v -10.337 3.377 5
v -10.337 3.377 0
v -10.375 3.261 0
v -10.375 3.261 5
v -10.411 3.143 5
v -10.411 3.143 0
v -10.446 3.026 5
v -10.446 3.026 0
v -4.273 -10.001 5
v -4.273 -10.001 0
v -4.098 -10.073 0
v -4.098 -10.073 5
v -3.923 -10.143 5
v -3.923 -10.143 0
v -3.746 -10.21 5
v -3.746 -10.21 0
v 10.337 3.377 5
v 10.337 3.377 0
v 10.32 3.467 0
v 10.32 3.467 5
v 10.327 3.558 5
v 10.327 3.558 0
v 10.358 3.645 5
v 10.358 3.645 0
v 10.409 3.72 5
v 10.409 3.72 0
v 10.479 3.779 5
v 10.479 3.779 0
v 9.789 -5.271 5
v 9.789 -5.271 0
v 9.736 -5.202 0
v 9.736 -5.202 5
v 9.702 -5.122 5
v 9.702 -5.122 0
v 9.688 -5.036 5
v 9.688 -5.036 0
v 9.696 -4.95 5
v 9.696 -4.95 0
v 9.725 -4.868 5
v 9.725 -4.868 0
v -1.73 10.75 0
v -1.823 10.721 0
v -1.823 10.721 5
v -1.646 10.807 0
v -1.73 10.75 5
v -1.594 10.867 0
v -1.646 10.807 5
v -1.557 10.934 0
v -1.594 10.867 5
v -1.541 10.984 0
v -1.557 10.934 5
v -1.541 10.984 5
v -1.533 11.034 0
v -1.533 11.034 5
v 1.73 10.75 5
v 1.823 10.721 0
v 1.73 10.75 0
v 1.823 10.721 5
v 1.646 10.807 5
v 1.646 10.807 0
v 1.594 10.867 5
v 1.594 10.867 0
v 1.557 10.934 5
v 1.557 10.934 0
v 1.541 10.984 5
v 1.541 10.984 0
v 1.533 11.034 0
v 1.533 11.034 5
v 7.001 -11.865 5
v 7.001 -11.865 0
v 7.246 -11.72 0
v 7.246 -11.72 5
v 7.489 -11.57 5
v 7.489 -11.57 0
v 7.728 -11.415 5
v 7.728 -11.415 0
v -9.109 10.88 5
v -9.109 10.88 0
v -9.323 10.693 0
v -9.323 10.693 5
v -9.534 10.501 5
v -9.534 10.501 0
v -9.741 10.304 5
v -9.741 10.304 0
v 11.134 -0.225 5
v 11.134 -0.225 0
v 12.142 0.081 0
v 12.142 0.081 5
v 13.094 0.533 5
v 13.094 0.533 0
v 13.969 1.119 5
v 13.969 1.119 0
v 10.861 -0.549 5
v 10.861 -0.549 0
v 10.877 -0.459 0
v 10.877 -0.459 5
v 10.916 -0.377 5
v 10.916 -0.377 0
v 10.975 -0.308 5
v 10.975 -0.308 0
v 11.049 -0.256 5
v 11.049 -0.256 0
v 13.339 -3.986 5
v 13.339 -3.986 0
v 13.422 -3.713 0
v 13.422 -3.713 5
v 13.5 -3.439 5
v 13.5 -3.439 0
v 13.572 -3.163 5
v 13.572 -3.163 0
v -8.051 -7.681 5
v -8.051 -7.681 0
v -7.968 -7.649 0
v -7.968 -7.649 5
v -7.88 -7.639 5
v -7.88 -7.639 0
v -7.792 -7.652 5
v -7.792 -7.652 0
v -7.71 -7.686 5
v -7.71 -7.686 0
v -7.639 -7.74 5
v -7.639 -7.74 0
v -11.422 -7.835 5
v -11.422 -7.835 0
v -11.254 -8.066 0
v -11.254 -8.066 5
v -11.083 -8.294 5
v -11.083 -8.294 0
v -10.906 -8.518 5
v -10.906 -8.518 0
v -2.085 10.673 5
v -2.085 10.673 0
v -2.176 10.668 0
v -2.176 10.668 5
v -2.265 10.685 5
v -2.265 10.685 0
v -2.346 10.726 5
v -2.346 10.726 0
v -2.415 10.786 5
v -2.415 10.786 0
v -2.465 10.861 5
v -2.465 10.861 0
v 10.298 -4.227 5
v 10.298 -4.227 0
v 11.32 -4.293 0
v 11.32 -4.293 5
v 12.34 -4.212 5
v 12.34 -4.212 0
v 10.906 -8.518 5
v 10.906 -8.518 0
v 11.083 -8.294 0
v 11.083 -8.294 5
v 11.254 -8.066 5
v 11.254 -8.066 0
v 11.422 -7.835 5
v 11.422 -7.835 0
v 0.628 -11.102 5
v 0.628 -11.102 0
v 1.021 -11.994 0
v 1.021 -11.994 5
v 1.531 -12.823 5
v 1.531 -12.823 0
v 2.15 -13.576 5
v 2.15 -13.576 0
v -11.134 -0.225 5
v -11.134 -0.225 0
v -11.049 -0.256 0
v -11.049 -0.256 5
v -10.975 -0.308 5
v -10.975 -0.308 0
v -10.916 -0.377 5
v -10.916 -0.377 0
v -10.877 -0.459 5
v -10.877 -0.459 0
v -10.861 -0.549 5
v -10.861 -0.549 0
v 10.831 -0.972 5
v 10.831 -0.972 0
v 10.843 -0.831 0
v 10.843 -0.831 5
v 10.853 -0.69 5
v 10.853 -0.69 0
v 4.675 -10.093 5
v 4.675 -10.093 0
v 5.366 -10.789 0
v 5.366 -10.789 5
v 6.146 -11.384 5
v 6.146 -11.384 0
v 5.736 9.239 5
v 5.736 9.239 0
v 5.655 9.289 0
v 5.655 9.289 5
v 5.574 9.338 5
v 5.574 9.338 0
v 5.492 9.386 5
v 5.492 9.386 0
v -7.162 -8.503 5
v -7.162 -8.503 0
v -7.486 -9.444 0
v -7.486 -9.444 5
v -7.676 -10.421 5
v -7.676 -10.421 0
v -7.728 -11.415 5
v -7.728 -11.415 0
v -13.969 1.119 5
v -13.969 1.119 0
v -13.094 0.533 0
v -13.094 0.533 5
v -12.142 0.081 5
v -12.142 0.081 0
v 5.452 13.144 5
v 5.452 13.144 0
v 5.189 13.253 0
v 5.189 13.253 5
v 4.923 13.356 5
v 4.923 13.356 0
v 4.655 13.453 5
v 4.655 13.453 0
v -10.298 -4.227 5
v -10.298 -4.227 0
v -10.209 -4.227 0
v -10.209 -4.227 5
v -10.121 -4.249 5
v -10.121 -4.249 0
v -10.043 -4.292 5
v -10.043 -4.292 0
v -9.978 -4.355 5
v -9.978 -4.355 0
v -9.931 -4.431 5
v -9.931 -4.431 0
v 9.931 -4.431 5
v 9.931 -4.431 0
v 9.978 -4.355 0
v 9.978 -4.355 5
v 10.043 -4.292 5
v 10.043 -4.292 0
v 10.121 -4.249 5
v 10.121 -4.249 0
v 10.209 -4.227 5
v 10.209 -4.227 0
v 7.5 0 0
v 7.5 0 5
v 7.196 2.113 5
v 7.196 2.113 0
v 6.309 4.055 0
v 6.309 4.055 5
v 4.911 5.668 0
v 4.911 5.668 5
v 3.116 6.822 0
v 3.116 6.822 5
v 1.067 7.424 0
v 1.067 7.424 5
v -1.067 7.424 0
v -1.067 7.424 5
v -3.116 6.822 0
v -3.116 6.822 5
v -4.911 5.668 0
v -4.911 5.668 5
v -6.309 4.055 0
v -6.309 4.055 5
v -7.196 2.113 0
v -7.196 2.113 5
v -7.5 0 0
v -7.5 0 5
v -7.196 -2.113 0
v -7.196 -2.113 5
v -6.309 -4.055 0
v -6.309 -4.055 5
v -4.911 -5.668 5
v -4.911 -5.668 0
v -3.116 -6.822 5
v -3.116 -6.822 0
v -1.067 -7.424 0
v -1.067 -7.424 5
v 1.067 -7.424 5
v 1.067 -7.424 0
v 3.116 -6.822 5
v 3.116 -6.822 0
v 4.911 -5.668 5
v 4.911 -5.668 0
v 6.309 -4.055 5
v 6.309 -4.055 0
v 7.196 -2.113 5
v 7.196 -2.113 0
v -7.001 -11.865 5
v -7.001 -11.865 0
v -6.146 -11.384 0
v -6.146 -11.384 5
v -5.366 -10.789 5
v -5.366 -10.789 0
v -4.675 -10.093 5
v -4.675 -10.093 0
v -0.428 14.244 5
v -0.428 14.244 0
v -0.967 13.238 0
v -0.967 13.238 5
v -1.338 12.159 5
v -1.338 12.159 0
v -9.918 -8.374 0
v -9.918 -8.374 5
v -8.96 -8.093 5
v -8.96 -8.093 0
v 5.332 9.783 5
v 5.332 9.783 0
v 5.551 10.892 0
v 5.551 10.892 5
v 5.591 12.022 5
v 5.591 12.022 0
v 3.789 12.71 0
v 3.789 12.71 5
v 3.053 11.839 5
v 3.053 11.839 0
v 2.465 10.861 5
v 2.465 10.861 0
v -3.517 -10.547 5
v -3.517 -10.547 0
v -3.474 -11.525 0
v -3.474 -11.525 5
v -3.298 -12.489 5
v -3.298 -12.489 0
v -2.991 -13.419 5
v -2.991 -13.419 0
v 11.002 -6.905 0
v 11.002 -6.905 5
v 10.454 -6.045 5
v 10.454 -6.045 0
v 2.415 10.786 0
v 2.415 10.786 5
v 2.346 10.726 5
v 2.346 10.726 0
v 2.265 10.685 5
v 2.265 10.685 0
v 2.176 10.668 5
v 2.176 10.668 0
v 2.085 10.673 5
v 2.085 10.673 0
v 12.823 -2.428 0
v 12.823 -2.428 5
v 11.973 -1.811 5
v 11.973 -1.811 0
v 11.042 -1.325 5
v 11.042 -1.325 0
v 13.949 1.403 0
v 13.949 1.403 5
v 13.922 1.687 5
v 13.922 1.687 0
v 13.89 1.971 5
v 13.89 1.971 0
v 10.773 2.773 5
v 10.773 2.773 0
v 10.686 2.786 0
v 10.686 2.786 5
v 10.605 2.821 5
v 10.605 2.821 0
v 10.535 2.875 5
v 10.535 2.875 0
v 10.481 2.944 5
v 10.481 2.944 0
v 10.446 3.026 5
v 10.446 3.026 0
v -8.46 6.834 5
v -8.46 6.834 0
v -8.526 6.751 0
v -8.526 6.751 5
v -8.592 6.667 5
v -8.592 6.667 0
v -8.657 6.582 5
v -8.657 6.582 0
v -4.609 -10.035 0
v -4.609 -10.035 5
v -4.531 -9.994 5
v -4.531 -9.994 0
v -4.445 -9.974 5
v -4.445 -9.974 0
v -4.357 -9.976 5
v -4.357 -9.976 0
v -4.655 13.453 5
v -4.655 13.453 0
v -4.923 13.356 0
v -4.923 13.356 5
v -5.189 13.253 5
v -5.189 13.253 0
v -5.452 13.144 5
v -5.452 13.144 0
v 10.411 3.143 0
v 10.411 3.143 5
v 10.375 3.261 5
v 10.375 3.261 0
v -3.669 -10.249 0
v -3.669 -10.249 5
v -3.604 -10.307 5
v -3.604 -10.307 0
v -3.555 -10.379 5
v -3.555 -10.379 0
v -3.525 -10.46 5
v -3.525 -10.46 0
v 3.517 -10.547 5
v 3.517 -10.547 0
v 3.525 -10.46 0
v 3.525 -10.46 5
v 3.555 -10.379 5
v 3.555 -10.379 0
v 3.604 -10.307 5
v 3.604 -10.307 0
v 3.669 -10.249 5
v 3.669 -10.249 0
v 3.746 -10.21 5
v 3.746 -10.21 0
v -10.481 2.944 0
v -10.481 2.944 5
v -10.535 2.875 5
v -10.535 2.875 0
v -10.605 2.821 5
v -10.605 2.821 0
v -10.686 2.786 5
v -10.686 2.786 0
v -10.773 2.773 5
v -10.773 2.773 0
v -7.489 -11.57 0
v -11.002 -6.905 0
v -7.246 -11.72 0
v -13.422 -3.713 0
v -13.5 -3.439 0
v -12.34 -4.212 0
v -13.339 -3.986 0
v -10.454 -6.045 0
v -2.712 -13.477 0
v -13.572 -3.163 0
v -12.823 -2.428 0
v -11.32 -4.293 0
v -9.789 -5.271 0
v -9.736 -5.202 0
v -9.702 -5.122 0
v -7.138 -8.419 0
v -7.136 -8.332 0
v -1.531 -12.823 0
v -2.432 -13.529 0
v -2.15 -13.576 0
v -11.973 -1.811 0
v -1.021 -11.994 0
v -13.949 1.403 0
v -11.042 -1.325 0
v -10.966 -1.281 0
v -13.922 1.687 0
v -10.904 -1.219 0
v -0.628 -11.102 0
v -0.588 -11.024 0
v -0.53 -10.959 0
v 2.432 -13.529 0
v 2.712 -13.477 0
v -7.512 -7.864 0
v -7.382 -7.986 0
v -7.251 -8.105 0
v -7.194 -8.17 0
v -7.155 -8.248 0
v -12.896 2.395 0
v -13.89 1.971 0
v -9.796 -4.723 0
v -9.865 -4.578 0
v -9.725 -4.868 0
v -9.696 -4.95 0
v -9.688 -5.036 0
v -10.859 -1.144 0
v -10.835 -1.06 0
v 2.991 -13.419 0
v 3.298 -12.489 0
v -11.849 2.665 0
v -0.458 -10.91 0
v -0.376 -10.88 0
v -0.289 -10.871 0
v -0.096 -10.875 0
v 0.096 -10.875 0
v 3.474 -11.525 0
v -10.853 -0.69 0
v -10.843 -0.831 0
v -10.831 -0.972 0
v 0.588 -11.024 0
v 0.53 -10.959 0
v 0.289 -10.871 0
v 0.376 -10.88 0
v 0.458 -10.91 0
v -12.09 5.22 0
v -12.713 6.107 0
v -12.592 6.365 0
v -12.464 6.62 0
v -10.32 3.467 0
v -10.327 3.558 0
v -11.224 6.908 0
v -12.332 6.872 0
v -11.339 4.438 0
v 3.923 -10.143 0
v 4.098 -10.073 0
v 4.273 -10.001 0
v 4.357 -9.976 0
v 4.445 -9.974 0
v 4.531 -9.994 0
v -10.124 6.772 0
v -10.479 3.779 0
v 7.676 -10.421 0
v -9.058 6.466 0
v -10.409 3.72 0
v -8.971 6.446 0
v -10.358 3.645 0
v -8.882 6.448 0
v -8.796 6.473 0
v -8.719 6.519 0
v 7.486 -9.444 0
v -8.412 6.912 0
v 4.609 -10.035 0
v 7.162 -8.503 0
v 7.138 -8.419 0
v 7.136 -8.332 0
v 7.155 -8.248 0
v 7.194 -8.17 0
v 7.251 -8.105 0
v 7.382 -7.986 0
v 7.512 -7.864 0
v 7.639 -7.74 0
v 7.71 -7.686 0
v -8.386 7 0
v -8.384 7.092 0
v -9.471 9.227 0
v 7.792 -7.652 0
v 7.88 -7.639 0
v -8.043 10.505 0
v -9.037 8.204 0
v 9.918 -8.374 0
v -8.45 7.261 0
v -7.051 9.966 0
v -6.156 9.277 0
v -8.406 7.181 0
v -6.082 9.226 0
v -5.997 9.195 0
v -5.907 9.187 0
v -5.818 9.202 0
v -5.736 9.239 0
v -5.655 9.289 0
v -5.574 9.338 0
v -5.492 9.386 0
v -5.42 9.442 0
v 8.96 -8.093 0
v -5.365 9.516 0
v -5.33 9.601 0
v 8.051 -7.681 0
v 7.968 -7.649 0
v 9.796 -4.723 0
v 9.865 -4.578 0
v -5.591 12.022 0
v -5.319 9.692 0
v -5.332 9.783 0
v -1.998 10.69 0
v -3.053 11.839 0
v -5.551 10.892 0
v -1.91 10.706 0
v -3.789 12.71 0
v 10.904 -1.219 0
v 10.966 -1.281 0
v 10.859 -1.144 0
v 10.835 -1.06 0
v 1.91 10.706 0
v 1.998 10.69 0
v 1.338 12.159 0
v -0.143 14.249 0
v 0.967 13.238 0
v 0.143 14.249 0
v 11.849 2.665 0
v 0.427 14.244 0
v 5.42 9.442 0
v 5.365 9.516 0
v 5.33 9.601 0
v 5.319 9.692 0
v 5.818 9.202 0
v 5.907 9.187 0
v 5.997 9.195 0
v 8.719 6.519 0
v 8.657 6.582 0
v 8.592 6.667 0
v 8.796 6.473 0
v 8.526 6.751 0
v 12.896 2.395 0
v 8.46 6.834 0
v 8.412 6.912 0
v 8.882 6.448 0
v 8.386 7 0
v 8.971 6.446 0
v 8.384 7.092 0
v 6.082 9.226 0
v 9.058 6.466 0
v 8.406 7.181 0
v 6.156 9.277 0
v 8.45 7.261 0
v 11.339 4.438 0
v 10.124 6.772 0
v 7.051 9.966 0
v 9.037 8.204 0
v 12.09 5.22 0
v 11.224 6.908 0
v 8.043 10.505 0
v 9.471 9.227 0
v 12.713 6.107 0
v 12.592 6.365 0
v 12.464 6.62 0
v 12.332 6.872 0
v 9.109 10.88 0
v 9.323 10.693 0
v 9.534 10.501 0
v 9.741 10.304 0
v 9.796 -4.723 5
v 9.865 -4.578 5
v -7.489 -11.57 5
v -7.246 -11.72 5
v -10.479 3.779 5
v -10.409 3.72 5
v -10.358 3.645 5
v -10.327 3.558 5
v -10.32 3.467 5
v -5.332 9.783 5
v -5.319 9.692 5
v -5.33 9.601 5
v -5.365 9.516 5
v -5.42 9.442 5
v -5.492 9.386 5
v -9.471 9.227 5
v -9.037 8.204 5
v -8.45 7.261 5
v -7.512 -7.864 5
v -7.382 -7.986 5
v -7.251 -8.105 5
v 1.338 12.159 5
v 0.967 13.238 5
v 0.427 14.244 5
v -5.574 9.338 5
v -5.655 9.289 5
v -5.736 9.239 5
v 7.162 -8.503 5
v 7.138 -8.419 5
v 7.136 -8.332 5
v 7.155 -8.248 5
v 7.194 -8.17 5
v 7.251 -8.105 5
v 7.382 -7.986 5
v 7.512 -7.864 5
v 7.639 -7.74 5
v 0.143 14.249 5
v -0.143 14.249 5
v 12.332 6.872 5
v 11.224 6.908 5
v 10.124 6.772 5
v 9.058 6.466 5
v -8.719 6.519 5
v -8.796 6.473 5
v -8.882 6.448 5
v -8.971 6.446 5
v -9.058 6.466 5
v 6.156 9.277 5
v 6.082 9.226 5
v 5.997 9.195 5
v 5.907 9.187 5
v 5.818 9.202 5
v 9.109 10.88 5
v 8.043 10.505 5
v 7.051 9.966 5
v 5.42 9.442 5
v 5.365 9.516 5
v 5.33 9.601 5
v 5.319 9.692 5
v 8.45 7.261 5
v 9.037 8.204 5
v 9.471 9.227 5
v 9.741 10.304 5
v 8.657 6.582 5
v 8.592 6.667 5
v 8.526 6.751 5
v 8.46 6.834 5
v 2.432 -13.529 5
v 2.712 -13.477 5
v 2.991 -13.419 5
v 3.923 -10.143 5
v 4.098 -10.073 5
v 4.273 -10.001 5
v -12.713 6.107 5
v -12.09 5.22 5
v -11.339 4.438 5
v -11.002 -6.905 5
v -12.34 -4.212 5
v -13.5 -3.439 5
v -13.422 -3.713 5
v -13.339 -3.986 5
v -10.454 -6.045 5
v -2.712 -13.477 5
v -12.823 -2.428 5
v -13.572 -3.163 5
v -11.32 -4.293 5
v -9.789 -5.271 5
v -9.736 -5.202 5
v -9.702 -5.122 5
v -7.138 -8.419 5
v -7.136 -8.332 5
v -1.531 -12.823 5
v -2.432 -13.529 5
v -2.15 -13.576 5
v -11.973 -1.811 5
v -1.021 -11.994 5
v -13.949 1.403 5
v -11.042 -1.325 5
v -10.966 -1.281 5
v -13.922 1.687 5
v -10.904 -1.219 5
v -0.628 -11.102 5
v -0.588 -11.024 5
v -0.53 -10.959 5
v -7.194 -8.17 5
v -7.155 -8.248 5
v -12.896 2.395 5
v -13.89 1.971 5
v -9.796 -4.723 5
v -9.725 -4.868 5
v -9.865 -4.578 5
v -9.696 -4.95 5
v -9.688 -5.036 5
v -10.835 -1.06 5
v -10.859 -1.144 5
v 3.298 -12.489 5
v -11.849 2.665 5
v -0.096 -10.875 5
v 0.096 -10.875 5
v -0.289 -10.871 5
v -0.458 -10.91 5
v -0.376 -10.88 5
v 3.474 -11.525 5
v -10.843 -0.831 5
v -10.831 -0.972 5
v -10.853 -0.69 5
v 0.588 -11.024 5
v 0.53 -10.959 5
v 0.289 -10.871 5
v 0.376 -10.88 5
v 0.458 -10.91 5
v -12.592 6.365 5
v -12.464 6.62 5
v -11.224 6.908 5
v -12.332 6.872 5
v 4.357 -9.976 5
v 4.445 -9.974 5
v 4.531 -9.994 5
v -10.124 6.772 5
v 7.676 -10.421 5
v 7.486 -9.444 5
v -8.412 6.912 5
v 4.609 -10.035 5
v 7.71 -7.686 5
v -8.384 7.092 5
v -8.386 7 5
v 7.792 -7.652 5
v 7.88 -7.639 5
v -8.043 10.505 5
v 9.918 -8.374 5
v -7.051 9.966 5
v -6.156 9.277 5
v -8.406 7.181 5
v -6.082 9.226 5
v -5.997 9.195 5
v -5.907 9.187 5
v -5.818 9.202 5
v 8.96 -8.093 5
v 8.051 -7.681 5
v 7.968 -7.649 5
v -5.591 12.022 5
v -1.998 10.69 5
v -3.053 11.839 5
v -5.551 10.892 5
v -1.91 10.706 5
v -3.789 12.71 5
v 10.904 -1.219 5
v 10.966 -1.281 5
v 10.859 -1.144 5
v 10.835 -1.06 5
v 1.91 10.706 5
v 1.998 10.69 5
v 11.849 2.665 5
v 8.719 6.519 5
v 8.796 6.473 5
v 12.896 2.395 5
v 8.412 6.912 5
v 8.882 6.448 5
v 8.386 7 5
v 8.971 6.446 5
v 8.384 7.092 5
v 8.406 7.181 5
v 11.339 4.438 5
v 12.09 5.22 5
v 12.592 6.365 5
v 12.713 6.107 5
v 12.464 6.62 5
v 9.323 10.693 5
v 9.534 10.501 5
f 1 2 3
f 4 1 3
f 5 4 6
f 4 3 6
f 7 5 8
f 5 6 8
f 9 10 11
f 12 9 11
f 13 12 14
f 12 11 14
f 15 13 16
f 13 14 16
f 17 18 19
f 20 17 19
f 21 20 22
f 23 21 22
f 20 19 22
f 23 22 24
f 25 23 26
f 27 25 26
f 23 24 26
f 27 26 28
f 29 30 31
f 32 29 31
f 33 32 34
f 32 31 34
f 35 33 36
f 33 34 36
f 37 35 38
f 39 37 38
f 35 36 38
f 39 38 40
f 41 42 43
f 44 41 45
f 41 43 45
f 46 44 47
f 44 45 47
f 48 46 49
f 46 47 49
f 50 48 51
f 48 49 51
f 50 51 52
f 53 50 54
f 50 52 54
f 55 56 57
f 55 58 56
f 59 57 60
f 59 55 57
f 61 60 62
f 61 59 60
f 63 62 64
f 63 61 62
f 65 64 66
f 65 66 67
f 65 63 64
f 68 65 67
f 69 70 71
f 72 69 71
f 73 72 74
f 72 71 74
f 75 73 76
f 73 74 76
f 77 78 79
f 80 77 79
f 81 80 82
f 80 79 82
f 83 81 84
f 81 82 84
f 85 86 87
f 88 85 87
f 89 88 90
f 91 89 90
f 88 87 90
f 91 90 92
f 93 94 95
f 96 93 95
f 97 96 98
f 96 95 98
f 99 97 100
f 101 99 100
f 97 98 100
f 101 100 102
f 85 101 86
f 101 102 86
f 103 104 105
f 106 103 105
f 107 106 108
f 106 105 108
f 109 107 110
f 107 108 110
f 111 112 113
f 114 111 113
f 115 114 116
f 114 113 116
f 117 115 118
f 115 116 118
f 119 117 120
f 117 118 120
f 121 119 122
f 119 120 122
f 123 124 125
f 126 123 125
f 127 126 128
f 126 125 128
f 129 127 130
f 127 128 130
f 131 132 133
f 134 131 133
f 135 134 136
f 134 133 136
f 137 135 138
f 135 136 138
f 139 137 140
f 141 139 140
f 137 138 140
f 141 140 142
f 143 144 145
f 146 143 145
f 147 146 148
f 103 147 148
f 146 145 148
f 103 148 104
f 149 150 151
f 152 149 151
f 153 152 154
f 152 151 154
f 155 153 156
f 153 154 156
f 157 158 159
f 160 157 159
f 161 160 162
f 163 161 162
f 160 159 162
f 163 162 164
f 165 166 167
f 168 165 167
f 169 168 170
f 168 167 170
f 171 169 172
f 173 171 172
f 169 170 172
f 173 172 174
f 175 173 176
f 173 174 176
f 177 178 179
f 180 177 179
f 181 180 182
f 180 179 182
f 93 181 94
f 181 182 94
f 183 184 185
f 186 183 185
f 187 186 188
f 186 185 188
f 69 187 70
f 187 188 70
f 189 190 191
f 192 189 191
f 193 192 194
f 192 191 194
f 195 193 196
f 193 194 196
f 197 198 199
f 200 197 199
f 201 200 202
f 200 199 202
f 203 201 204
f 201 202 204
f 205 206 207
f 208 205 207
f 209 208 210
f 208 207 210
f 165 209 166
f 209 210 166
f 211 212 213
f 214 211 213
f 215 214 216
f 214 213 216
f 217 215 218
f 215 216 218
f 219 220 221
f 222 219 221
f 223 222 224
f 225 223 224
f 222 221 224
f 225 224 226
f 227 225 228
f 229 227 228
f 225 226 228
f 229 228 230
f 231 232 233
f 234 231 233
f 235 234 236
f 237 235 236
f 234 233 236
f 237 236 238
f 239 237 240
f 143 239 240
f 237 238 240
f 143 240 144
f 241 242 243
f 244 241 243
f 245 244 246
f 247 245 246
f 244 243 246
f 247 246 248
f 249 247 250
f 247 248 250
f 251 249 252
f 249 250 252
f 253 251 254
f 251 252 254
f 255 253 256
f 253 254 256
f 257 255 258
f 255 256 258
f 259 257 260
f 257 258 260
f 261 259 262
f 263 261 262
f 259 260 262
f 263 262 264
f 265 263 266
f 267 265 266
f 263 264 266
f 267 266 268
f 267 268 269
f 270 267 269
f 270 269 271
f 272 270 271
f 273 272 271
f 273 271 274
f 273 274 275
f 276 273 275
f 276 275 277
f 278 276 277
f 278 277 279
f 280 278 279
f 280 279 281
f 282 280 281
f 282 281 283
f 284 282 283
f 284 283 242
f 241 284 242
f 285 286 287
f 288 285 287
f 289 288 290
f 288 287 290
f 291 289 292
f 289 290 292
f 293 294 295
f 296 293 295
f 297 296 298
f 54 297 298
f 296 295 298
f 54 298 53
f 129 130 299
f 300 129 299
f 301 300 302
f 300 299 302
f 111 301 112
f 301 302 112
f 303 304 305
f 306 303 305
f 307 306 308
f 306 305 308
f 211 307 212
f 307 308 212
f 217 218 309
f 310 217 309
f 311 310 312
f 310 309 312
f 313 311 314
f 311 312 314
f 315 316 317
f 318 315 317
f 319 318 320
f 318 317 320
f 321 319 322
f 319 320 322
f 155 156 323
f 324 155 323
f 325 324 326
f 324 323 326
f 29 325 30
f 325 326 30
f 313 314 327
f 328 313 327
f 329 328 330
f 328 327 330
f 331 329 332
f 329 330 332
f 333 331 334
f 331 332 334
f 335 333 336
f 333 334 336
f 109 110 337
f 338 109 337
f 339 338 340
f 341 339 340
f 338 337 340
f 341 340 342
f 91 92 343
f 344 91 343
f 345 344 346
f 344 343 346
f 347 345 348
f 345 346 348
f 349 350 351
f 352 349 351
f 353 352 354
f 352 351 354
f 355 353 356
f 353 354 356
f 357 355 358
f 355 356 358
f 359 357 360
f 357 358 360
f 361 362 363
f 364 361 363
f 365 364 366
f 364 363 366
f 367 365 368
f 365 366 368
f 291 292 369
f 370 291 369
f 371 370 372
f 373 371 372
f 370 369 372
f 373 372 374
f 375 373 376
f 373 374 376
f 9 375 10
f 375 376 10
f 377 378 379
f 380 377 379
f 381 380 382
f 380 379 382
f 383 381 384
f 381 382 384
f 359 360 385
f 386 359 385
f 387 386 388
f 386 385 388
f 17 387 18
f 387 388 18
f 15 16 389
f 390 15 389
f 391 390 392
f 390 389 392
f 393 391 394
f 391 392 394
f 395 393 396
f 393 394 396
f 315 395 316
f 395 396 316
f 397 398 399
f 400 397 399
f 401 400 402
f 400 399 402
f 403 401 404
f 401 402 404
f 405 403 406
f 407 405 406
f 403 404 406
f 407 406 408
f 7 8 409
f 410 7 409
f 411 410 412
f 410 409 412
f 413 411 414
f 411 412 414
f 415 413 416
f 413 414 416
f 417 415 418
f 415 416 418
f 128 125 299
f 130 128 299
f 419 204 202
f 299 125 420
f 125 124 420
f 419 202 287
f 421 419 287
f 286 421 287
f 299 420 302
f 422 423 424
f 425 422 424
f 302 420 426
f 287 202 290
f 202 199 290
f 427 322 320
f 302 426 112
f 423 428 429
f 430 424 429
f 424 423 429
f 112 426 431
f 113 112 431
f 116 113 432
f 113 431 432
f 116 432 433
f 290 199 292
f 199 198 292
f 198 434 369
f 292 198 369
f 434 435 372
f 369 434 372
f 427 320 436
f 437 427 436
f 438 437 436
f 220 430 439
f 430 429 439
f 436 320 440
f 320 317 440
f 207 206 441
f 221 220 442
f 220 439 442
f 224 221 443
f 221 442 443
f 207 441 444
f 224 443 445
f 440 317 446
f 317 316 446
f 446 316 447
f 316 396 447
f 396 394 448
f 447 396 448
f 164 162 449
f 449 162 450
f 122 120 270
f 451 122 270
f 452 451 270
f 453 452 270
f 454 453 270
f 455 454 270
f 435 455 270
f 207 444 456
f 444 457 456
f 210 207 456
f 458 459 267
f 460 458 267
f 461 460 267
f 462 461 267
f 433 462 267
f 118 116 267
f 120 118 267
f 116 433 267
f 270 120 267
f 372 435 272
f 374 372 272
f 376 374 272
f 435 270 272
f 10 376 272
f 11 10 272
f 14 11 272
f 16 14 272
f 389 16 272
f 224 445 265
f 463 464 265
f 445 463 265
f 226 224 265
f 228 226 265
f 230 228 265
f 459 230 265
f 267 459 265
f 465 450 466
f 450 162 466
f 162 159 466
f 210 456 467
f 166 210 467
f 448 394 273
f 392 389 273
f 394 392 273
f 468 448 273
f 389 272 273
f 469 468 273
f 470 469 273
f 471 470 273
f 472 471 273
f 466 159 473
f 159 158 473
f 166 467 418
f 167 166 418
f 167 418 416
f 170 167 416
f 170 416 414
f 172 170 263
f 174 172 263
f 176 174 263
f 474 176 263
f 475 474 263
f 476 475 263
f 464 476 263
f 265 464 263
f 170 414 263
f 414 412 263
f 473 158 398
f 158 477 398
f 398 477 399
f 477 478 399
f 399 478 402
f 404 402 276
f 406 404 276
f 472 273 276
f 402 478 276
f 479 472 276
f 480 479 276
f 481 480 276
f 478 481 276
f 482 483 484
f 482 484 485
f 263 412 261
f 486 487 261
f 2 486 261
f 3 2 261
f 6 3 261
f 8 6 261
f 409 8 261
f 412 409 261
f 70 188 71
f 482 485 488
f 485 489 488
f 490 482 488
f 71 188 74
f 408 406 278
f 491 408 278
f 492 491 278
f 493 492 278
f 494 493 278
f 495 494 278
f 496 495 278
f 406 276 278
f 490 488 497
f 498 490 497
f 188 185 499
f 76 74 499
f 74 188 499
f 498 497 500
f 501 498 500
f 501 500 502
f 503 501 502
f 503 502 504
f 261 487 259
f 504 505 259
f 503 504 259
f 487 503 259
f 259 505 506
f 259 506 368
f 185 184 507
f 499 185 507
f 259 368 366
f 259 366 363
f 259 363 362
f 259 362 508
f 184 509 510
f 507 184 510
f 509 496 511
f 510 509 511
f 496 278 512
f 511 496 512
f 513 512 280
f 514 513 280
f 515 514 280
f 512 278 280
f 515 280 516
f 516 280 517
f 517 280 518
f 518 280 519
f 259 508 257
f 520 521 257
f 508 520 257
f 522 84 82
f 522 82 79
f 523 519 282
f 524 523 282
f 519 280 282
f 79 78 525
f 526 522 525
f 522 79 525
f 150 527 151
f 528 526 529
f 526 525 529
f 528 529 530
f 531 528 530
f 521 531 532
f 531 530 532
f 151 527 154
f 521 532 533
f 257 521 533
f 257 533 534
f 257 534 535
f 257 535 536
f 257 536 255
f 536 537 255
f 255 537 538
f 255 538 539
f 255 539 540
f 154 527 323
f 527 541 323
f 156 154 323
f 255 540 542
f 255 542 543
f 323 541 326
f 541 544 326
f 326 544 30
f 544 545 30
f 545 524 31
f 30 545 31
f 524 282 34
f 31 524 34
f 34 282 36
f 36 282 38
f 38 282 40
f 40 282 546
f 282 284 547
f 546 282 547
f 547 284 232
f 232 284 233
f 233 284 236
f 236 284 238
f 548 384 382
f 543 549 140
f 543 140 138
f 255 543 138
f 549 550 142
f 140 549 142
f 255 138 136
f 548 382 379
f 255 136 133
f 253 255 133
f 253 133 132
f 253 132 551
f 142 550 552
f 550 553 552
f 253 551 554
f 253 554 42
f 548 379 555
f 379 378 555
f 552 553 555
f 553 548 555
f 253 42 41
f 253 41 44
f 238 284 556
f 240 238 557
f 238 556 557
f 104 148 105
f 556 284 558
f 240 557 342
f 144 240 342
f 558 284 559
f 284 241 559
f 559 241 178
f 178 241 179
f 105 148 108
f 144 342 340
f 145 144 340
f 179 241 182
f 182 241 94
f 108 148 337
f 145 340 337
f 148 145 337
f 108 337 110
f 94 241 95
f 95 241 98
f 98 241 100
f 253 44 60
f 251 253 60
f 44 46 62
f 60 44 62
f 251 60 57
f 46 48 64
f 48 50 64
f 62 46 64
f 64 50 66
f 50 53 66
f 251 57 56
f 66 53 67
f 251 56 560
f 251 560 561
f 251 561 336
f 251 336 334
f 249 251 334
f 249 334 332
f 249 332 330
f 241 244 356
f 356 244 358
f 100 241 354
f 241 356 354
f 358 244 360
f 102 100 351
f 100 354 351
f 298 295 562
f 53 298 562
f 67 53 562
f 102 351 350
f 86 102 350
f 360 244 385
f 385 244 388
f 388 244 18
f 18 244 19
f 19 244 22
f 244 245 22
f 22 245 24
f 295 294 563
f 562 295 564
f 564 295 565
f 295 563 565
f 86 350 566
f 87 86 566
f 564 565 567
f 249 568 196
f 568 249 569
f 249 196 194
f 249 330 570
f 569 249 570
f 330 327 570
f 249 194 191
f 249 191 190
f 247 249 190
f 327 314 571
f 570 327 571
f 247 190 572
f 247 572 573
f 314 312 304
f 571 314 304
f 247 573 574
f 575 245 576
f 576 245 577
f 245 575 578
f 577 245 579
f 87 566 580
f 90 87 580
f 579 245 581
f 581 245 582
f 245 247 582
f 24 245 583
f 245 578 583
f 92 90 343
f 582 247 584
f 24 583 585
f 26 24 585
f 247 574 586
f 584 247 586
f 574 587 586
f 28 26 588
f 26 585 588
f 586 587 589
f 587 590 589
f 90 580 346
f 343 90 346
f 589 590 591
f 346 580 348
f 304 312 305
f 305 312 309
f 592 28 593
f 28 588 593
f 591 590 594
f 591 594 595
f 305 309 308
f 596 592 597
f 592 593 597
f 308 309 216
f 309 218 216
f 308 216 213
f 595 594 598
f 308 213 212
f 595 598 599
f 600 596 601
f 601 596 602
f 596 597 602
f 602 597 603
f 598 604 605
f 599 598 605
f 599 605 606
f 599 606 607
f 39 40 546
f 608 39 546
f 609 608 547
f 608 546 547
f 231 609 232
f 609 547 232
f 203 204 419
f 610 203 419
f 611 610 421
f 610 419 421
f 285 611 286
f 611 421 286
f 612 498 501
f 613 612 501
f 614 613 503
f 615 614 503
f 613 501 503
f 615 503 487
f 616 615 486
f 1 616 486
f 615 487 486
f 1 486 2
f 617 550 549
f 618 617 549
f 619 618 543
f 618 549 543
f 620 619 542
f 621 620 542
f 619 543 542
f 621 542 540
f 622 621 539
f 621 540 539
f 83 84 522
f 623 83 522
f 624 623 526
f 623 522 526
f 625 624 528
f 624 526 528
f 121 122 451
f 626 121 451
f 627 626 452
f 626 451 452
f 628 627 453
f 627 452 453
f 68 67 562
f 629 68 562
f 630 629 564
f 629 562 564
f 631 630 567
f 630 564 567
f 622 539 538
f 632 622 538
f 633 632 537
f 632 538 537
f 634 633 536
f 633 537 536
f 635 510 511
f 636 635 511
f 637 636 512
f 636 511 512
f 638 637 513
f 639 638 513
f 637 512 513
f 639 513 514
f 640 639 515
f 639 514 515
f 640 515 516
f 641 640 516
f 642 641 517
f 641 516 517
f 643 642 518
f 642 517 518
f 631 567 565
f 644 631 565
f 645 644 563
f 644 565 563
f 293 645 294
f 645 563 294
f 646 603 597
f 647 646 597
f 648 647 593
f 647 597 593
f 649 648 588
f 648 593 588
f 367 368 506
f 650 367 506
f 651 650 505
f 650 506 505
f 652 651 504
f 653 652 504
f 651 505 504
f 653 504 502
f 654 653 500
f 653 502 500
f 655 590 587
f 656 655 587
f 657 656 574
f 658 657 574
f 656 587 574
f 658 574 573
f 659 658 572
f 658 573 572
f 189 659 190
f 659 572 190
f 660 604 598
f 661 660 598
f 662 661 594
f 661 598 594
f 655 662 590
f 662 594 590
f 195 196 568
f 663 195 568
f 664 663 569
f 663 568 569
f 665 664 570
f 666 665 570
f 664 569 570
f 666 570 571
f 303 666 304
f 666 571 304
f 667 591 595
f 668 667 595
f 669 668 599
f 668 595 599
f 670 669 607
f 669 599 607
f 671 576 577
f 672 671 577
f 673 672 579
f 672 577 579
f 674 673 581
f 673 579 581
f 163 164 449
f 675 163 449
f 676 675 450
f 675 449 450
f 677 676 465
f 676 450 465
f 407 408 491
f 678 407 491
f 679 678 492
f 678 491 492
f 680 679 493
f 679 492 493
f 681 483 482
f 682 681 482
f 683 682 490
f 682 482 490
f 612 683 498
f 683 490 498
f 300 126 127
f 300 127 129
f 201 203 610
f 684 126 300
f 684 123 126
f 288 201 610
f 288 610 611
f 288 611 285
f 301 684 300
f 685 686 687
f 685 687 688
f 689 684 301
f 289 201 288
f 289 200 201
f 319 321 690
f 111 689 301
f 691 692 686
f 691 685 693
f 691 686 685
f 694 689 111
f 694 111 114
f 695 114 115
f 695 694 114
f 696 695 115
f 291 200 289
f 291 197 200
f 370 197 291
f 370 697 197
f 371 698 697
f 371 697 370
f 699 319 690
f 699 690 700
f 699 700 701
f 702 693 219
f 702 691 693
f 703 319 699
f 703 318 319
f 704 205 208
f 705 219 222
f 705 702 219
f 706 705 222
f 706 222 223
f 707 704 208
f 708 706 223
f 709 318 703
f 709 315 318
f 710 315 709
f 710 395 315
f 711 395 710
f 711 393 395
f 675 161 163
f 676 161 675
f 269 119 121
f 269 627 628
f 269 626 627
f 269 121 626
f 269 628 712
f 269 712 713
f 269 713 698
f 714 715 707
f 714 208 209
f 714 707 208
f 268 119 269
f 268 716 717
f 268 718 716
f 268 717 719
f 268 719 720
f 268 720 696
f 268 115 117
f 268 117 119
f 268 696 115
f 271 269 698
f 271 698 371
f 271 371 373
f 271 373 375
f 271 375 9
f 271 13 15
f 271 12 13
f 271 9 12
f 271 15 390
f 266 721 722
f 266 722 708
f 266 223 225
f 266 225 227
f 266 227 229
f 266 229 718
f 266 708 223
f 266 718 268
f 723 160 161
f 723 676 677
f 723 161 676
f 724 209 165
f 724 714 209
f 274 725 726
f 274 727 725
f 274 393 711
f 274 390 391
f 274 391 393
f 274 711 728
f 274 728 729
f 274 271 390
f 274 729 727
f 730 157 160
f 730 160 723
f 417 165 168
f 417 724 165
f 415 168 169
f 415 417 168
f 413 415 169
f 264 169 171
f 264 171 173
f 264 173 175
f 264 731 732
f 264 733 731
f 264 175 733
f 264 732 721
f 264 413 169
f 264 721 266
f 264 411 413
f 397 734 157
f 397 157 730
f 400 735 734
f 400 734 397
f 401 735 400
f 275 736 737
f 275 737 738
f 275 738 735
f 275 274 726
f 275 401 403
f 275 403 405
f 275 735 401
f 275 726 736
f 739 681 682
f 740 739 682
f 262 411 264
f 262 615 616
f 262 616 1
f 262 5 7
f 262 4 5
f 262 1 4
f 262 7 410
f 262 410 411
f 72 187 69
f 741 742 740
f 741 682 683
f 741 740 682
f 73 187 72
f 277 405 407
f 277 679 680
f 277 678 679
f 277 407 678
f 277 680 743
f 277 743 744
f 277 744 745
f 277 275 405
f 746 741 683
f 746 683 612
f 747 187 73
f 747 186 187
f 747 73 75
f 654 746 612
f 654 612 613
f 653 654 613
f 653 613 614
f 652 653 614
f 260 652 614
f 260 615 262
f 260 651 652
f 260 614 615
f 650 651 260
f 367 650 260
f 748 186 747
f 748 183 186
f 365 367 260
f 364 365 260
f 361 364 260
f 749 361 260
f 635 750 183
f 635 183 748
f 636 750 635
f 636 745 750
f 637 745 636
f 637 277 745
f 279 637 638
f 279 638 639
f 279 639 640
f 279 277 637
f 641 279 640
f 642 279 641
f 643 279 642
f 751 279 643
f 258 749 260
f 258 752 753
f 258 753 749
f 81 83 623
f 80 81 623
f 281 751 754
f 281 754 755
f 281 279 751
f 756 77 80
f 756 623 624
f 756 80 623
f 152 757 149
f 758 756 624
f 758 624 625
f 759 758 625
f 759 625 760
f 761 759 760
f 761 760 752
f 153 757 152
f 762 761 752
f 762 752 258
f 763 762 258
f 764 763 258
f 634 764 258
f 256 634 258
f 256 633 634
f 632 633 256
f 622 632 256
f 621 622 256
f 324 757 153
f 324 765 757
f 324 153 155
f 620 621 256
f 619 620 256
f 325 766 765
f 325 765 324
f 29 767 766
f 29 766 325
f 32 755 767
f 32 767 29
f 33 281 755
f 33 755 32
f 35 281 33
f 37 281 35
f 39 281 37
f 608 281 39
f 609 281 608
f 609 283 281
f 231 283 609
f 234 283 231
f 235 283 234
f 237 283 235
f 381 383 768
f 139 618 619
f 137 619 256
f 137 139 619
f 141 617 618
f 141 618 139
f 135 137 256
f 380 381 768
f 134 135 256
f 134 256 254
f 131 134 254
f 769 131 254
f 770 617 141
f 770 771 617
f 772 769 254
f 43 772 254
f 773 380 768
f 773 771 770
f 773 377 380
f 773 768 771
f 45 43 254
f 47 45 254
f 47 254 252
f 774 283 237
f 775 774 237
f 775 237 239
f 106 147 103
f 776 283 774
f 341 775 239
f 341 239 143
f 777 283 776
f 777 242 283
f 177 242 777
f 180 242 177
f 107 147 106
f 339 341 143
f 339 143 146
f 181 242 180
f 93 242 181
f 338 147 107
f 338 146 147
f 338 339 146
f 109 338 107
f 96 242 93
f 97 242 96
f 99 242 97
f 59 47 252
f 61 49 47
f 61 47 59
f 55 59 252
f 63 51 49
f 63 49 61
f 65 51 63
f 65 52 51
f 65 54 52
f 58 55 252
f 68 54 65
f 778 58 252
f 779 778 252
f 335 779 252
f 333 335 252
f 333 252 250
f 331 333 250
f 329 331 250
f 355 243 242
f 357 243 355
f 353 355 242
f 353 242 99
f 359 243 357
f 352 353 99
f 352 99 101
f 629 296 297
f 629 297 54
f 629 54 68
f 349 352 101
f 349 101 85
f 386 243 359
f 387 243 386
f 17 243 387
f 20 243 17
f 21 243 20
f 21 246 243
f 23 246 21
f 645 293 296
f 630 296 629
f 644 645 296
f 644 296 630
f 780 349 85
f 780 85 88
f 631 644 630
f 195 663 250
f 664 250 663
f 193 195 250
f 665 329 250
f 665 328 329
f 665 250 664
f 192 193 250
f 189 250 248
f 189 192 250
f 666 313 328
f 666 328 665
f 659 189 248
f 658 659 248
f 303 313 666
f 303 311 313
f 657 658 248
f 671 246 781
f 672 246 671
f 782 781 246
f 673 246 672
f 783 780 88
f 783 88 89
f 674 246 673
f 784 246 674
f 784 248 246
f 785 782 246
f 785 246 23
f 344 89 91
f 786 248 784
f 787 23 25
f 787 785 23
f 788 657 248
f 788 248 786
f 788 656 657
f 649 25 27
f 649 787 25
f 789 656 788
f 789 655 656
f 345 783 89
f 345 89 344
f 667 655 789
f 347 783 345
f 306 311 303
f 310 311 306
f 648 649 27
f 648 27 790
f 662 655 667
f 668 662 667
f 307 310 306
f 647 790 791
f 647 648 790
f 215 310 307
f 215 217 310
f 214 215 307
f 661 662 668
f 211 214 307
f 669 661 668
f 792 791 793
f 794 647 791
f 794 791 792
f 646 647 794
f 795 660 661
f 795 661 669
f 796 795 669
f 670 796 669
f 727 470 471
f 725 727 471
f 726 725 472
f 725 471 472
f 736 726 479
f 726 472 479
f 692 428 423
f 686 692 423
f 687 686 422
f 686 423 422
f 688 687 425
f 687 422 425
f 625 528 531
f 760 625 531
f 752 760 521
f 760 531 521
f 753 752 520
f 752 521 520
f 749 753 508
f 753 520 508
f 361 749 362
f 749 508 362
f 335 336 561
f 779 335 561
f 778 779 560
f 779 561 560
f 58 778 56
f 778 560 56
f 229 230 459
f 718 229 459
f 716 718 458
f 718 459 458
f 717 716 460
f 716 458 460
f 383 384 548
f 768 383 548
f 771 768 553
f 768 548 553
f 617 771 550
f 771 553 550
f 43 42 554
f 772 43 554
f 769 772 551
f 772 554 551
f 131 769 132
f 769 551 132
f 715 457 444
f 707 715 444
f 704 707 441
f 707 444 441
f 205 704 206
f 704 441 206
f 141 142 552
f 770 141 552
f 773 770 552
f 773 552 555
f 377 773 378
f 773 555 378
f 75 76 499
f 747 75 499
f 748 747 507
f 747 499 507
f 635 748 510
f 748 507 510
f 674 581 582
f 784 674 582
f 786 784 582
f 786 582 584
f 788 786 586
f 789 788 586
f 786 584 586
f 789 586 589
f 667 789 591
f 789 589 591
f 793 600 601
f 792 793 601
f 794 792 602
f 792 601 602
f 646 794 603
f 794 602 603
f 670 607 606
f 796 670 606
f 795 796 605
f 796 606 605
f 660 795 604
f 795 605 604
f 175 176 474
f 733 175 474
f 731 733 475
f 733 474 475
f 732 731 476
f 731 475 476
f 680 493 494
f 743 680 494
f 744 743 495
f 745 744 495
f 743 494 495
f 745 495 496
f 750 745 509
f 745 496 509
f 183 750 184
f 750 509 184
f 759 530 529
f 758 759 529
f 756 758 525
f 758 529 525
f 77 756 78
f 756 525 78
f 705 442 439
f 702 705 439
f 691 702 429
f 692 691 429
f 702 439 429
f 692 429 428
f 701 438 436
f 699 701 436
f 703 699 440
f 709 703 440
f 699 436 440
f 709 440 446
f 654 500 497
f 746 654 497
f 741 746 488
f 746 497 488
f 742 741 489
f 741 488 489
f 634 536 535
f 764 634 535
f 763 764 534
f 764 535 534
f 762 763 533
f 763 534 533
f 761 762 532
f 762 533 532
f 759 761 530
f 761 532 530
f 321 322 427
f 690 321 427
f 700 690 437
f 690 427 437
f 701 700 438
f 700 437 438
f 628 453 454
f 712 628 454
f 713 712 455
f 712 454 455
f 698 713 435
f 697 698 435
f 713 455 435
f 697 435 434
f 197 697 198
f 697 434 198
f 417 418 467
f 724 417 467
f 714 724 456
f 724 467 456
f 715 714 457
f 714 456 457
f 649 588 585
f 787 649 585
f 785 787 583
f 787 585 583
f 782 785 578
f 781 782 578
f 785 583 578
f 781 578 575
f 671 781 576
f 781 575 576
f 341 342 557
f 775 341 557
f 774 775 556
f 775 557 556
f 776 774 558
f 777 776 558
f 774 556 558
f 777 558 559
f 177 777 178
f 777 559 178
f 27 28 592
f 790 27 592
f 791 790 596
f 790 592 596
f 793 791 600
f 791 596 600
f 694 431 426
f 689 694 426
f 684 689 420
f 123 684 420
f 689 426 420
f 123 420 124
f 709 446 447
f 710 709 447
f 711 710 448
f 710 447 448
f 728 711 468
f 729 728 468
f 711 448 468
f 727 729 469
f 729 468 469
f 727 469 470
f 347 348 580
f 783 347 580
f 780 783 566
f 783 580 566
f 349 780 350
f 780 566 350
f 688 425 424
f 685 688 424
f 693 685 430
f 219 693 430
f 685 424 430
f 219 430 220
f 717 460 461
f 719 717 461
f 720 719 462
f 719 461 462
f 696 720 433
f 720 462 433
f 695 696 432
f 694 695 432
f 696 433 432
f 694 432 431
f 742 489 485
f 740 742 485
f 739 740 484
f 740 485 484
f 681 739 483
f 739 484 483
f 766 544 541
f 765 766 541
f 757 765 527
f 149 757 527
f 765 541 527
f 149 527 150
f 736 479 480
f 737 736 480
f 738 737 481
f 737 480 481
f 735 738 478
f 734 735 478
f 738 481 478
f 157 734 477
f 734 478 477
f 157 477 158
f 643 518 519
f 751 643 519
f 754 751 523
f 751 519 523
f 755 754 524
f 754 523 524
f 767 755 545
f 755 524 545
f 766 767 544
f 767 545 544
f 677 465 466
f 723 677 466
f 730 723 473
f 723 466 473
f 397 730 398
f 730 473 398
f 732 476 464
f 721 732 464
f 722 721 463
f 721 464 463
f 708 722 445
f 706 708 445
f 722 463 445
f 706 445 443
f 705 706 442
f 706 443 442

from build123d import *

# Parameters (mm, degrees)
SKETCH_1_R               = 10.875
EXTRUDE_1_DEPTH          = 5
EXTRUDE_2_DEPTH          = 5
FILLET_1_R               = 0.35
PATTERN_CIRCULAR_1_DEPTH = 5
CUT_EXTRUDE_1_REACH      = 22.572
SKETCH_2_R               = 7.5


# Read off the part's stored shape, not the designer's step: 원형 패턴1
with BuildPart() as part:
    # 스케치1 → 보스-돌출1 (new body)
    with BuildSketch(Plane.XY):
        Circle(SKETCH_1_R)
    extrude(amount=EXTRUDE_1_DEPTH)

    # 스케치1<3> → 보스-돌출2 (add)
    with BuildSketch(Plane.XY):
        with BuildLine():
            ThreePointArc((1.5525, 10.763613183), (1.216970842, 12.576974386), (0.4275, 14.243586057))
            ThreePointArc((0.4275, 14.243586057), (0, 14.25), (-0.4275, 14.243586057))
            ThreePointArc((-0.4275, 14.243586057), (-1.216970842, 12.576974386), (-1.5525, 10.763613183))
            ThreePointArc((-1.5525, 10.763613183), (0, 10.875), (1.5525, 10.763613183))
        make_face()
    extrude(amount=EXTRUDE_2_DEPTH)

    # 필렛1
    fillet_1_edges = [part.edges().sort_by_distance(p)[0] for p in [
        (-1.5525, 10.763613183, 2.5),
        (1.5525, 10.763613183, 2.5),
    ]]
    fillet(fillet_1_edges, radius=FILLET_1_R)

    # 원형 패턴1 outline → 원형 패턴1 (add)
    with BuildSketch(Plane.XY):
        with BuildLine():
            ThreePointArc((2.084837088, 10.673288121), (3.842906104, 10.173381821), (5.492422476, 9.386102511))
            ThreePointArc((5.492422476, 9.386102511), (5.344646109, 9.557145045), (5.332233471, 9.782842475))
            ThreePointArc((5.332233471, 9.782842475), (5.593355494, 11.4564781), (5.452236305, 13.144472855))
            ThreePointArc((5.452236305, 13.144472855), (5.055921411, 13.304884491), (4.654972549, 13.453334479))
            ThreePointArc((4.654972549, 13.453334479), (3.403689946, 12.289385973), (2.465385752, 10.861075951))
            ThreePointArc((2.465385752, 10.861075951), (2.306817266, 10.702930709), (2.084837088, 10.673288121))
        make_face()
        with BuildLine():
            ThreePointArc((5.736195698, 9.2391387), (7.199095251, 8.150990895), (8.459646862, 6.833739823))
            ThreePointArc((8.459646862, 6.833739823), (8.381997736, 7.045900933), (8.450146114, 7.261301773))
            ThreePointArc((8.450146114, 7.261301773), (9.274201483, 8.707038787), (9.740617886, 10.304436202))
            ThreePointArc((9.740617886, 10.304436202), (9.42901262, 10.597181051), (9.108765262, 10.880445977))
            ThreePointArc((9.108765262, 10.880445977), (7.536352291, 10.255192371), (6.155612256, 9.27693802))
            ThreePointArc((6.155612256, 9.27693802), (5.952224819, 9.187903085), (5.736195698, 9.2391387))
        make_face()
        with BuildLine():
            ThreePointArc((8.656847778, 6.582143386), (9.631277253, 5.050160738), (10.337248772, 3.377412148))
            ThreePointArc((10.337248772, 3.377412148), (10.339832595, 3.602419922), (10.478866532, 3.779351375))
            ThreePointArc((10.478866532, 3.779351375), (11.729603042, 4.815098477), (12.713475046, 6.107038785))
            ThreePointArc((12.713475046, 6.107038785), (12.528663426, 6.492580033), (12.332368752, 6.872403399))
            ThreePointArc((12.332368752, 6.872403399), (10.671238348, 6.86130469), (9.057778331, 6.466052652))
            ThreePointArc((9.057778331, 6.466052652), (8.838113972, 6.457792134), (8.656847778, 6.582143386))
        make_face()
        with BuildLine():
            ThreePointArc((10.44566348, 3.025514743), (10.802249116, 1.255802147), (10.861158072, -0.548516485))
            ThreePointArc((10.861158072, -0.548516485), (10.943077602, -0.34062274), (11.134084318, -0.224661311))
            ThreePointArc((11.134084318, -0.224661311), (12.626546762, 0.289328326), (13.969306954, 1.119162384))
            ThreePointArc((13.969306954, 1.119162384), (13.936248813, 1.545430549), (13.890417506, 1.970515105))
            ThreePointArc((13.890417506, 1.970515105), (12.377771936, 2.549980076), (10.773358461, 2.772990553))
            ThreePointArc((10.773358461, 2.772990553), (10.568207288, 2.845653785), (10.44566348, 3.025514743))
        make_face()
        with BuildLine():
            ThreePointArc((10.831434222, -0.972449329), (10.524388312, -2.739137757), (9.931200049, -4.431353133))
            ThreePointArc((9.931200049, -4.431353133), (10.080749628, -4.26807205), (10.298365111, -4.227215102))
            ThreePointArc((10.298365111, -4.227215102), (11.831510548, -4.270865326), (13.338506551, -3.985552654))
            ThreePointArc((13.338506551, -3.985552654), (13.461666574, -3.57612745), (13.572488407, -3.163191729))
            ThreePointArc((13.572488407, -3.163191729), (12.409057254, -2.103647039), (11.041512467, -1.325168872))
            ThreePointArc((11.041512467, -1.325168872), (10.879326869, -1.182845296), (10.831434222, -0.972449329))
        make_face()
        with BuildLine():
            ThreePointArc((9.724818044, -4.867600951), (8.799895988, -6.389636578), (7.638946645, -7.74029193))
            ThreePointArc((7.638946645, -7.74029193), (7.835322049, -7.642919348), (8.051101932, -7.68143897))
            ThreePointArc((8.051101932, -7.68143897), (9.434573038, -8.250170344), (10.906266927, -8.517686277))
            ThreePointArc((10.906266927, -8.517686277), (11.169011671, -8.180399177), (11.421519541, -7.835381548))
            ThreePointArc((11.421519541, -7.835381548), (10.743744256, -6.465085659), (9.78938361, -5.27081353))
            ThreePointArc((9.78938361, -5.27081353), (9.692203368, -5.079599132), (9.724818044, -4.867600951))
        make_face()
        with BuildLine():
            ThreePointArc((7.250855805, -8.104980882), (5.839114845, -9.174440736), (4.272503154, -10.000567074))
            ThreePointArc((4.272503154, -10.000567074), (4.488726043, -9.981391229), (4.674670149, -10.09339498))
            ThreePointArc((4.674670149, -10.09339498), (5.746046713, -11.099844355), (7.00107552, -11.865148727))
            ThreePointArc((7.00107552, -11.865148727), (7.367919852, -11.645552222), (7.728011172, -11.415049228))
            ThreePointArc((7.728011172, -11.415049228), (7.598229184, -9.929070664), (7.162058655, -8.502630716))
            ThreePointArc((7.162058655, -8.502630716), (7.142629708, -8.289552802), (7.250855805, -8.104980882))
        make_face()
        with BuildLine():
            ThreePointArc((3.745858716, -10.209513577), (2.04453627, -10.681081239), (0.289330355, -10.871150489))
            ThreePointArc((0.289330355, -10.871150489), (0.495925275, -10.93192564), (0.627834307, -11.102146342))
            ThreePointArc((0.627834307, -11.102146342), (1.261761796, -12.417365945), (2.150350071, -13.57584665))
            ThreePointArc((2.150350071, -13.57584665), (2.57174963, -13.503598465), (2.990792071, -13.418740812))
            ThreePointArc((2.990792071, -13.418740812), (3.40225572, -12.010026536), (3.516526006, -10.546906395))
            ThreePointArc((3.516526006, -10.546906395), (3.576953157, -10.341342504), (3.745858716, -10.209513577))
        make_face()
        with BuildLine():
            ThreePointArc((-0.289330355, -10.871150489), (-2.04453627, -10.681081239), (-3.745858716, -10.209513577))
            ThreePointArc((-3.745858716, -10.209513577), (-3.576953157, -10.341342504), (-3.516526006, -10.546906395))
            ThreePointArc((-3.516526006, -10.546906395), (-3.40225572, -12.010026536), (-2.990792071, -13.418740812))
            ThreePointArc((-2.990792071, -13.418740812), (-2.57174963, -13.503598465), (-2.150350071, -13.57584665))
            ThreePointArc((-2.150350071, -13.57584665), (-1.261761796, -12.417365945), (-0.627834307, -11.102146342))
            ThreePointArc((-0.627834307, -11.102146342), (-0.495925275, -10.93192564), (-0.289330355, -10.871150489))
        make_face()
        with BuildLine():
            ThreePointArc((-4.272503154, -10.000567074), (-5.839114845, -9.174440736), (-7.250855805, -8.104980882))
            ThreePointArc((-7.250855805, -8.104980882), (-7.142629708, -8.289552802), (-7.162058655, -8.502630716))
            ThreePointArc((-7.162058655, -8.502630716), (-7.598229184, -9.929070664), (-7.728011172, -11.415049228))
            ThreePointArc((-7.728011172, -11.415049228), (-7.367919852, -11.645552222), (-7.00107552, -11.865148727))
            ThreePointArc((-7.00107552, -11.865148727), (-5.746046713, -11.099844355), (-4.674670149, -10.09339498))
            ThreePointArc((-4.674670149, -10.09339498), (-4.488726043, -9.981391229), (-4.272503154, -10.000567074))
        make_face()
        with BuildLine():
            ThreePointArc((-7.638946645, -7.74029193), (-8.799895988, -6.389636578), (-9.724818044, -4.867600951))
            ThreePointArc((-9.724818044, -4.867600951), (-9.692203368, -5.079599132), (-9.78938361, -5.27081353))
            ThreePointArc((-9.78938361, -5.27081353), (-10.743744256, -6.465085659), (-11.421519541, -7.835381548))
            ThreePointArc((-11.421519541, -7.835381548), (-11.169011671, -8.180399177), (-10.906266927, -8.517686277))
            ThreePointArc((-10.906266927, -8.517686277), (-9.434573038, -8.250170344), (-8.051101932, -7.68143897))
            ThreePointArc((-8.051101932, -7.68143897), (-7.835322049, -7.642919348), (-7.638946645, -7.74029193))
        make_face()
        with BuildLine():
            ThreePointArc((-9.931200049, -4.431353133), (-10.524388312, -2.739137757), (-10.831434222, -0.972449329))
            ThreePointArc((-10.831434222, -0.972449329), (-10.879326869, -1.182845296), (-11.041512467, -1.325168872))
            ThreePointArc((-11.041512467, -1.325168872), (-12.409057254, -2.103647039), (-13.572488407, -3.163191729))
            ThreePointArc((-13.572488407, -3.163191729), (-13.461666574, -3.57612745), (-13.338506551, -3.985552654))
            ThreePointArc((-13.338506551, -3.985552654), (-11.831510548, -4.270865326), (-10.298365111, -4.227215102))
            ThreePointArc((-10.298365111, -4.227215102), (-10.080749628, -4.26807205), (-9.931200049, -4.431353133))
        make_face()
        with BuildLine():
            ThreePointArc((-10.861158072, -0.548516485), (-10.802249116, 1.255802147), (-10.44566348, 3.025514743))
            ThreePointArc((-10.44566348, 3.025514743), (-10.568207288, 2.845653785), (-10.773358461, 2.772990553))
            ThreePointArc((-10.773358461, 2.772990553), (-12.377771936, 2.549980076), (-13.890417506, 1.970515105))
            ThreePointArc((-13.890417506, 1.970515105), (-13.936248813, 1.545430549), (-13.969306954, 1.119162384))
            ThreePointArc((-13.969306954, 1.119162384), (-12.626546762, 0.289328326), (-11.134084318, -0.224661311))
            ThreePointArc((-11.134084318, -0.224661311), (-10.943077602, -0.34062274), (-10.861158072, -0.548516485))
        make_face()
        with BuildLine():
            ThreePointArc((-10.337248772, 3.377412148), (-9.631277253, 5.050160738), (-8.656847778, 6.582143386))
            ThreePointArc((-8.656847778, 6.582143386), (-8.838113972, 6.457792134), (-9.057778331, 6.466052652))
            ThreePointArc((-9.057778331, 6.466052652), (-10.671238348, 6.86130469), (-12.332368752, 6.872403399))
            ThreePointArc((-12.332368752, 6.872403399), (-12.528663426, 6.492580033), (-12.713475046, 6.107038785))
            ThreePointArc((-12.713475046, 6.107038785), (-11.729603042, 4.815098477), (-10.478866532, 3.779351375))
            ThreePointArc((-10.478866532, 3.779351375), (-10.339832595, 3.602419922), (-10.337248772, 3.377412148))
        make_face()
        with BuildLine():
            ThreePointArc((-8.459646862, 6.833739823), (-7.199095251, 8.150990895), (-5.736195698, 9.2391387))
            ThreePointArc((-5.736195698, 9.2391387), (-5.952224819, 9.187903085), (-6.155612256, 9.27693802))
            ThreePointArc((-6.155612256, 9.27693802), (-7.536352291, 10.255192371), (-9.108765262, 10.880445977))
            ThreePointArc((-9.108765262, 10.880445977), (-9.42901262, 10.597181051), (-9.740617886, 10.304436202))
            ThreePointArc((-9.740617886, 10.304436202), (-9.274201483, 8.707038787), (-8.450146114, 7.261301773))
            ThreePointArc((-8.450146114, 7.261301773), (-8.381997736, 7.045900933), (-8.459646862, 6.833739823))
        make_face()
        with BuildLine():
            ThreePointArc((-2.465385752, 10.861075951), (-3.403689946, 12.289385973), (-4.654972549, 13.453334479))
            ThreePointArc((-4.654972549, 13.453334479), (-5.055921411, 13.304884491), (-5.452236305, 13.144472855))
            ThreePointArc((-5.452236305, 13.144472855), (-5.593355494, 11.4564781), (-5.332233471, 9.782842475))
            ThreePointArc((-5.332233471, 9.782842475), (-5.344646109, 9.557145045), (-5.492422476, 9.386102511))
            ThreePointArc((-5.492422476, 9.386102511), (-3.842906104, 10.173381821), (-2.084837088, 10.673288121))
            ThreePointArc((-2.084837088, 10.673288121), (-2.306817266, 10.702930709), (-2.465385752, 10.861075951))
        make_face()
    extrude(amount=PATTERN_CIRCULAR_1_DEPTH)

    # 스케치2 → 컷-돌출1 (cut, up to next)
    with BuildSketch(Plane.XY.offset(5), mode=Mode.PRIVATE) as cut_extrude_1_sk1:
        Circle(SKETCH_2_R)
    cut_extrude_1_tool1 = extrude(cut_extrude_1_sk1.sketch, amount=-CUT_EXTRUDE_1_REACH, mode=Mode.PRIVATE) & part.part
    add(cut_extrude_1_tool1.solids().sort_by_distance((0, 0, 5))[0], mode=Mode.SUBTRACT)


solid = part.part
